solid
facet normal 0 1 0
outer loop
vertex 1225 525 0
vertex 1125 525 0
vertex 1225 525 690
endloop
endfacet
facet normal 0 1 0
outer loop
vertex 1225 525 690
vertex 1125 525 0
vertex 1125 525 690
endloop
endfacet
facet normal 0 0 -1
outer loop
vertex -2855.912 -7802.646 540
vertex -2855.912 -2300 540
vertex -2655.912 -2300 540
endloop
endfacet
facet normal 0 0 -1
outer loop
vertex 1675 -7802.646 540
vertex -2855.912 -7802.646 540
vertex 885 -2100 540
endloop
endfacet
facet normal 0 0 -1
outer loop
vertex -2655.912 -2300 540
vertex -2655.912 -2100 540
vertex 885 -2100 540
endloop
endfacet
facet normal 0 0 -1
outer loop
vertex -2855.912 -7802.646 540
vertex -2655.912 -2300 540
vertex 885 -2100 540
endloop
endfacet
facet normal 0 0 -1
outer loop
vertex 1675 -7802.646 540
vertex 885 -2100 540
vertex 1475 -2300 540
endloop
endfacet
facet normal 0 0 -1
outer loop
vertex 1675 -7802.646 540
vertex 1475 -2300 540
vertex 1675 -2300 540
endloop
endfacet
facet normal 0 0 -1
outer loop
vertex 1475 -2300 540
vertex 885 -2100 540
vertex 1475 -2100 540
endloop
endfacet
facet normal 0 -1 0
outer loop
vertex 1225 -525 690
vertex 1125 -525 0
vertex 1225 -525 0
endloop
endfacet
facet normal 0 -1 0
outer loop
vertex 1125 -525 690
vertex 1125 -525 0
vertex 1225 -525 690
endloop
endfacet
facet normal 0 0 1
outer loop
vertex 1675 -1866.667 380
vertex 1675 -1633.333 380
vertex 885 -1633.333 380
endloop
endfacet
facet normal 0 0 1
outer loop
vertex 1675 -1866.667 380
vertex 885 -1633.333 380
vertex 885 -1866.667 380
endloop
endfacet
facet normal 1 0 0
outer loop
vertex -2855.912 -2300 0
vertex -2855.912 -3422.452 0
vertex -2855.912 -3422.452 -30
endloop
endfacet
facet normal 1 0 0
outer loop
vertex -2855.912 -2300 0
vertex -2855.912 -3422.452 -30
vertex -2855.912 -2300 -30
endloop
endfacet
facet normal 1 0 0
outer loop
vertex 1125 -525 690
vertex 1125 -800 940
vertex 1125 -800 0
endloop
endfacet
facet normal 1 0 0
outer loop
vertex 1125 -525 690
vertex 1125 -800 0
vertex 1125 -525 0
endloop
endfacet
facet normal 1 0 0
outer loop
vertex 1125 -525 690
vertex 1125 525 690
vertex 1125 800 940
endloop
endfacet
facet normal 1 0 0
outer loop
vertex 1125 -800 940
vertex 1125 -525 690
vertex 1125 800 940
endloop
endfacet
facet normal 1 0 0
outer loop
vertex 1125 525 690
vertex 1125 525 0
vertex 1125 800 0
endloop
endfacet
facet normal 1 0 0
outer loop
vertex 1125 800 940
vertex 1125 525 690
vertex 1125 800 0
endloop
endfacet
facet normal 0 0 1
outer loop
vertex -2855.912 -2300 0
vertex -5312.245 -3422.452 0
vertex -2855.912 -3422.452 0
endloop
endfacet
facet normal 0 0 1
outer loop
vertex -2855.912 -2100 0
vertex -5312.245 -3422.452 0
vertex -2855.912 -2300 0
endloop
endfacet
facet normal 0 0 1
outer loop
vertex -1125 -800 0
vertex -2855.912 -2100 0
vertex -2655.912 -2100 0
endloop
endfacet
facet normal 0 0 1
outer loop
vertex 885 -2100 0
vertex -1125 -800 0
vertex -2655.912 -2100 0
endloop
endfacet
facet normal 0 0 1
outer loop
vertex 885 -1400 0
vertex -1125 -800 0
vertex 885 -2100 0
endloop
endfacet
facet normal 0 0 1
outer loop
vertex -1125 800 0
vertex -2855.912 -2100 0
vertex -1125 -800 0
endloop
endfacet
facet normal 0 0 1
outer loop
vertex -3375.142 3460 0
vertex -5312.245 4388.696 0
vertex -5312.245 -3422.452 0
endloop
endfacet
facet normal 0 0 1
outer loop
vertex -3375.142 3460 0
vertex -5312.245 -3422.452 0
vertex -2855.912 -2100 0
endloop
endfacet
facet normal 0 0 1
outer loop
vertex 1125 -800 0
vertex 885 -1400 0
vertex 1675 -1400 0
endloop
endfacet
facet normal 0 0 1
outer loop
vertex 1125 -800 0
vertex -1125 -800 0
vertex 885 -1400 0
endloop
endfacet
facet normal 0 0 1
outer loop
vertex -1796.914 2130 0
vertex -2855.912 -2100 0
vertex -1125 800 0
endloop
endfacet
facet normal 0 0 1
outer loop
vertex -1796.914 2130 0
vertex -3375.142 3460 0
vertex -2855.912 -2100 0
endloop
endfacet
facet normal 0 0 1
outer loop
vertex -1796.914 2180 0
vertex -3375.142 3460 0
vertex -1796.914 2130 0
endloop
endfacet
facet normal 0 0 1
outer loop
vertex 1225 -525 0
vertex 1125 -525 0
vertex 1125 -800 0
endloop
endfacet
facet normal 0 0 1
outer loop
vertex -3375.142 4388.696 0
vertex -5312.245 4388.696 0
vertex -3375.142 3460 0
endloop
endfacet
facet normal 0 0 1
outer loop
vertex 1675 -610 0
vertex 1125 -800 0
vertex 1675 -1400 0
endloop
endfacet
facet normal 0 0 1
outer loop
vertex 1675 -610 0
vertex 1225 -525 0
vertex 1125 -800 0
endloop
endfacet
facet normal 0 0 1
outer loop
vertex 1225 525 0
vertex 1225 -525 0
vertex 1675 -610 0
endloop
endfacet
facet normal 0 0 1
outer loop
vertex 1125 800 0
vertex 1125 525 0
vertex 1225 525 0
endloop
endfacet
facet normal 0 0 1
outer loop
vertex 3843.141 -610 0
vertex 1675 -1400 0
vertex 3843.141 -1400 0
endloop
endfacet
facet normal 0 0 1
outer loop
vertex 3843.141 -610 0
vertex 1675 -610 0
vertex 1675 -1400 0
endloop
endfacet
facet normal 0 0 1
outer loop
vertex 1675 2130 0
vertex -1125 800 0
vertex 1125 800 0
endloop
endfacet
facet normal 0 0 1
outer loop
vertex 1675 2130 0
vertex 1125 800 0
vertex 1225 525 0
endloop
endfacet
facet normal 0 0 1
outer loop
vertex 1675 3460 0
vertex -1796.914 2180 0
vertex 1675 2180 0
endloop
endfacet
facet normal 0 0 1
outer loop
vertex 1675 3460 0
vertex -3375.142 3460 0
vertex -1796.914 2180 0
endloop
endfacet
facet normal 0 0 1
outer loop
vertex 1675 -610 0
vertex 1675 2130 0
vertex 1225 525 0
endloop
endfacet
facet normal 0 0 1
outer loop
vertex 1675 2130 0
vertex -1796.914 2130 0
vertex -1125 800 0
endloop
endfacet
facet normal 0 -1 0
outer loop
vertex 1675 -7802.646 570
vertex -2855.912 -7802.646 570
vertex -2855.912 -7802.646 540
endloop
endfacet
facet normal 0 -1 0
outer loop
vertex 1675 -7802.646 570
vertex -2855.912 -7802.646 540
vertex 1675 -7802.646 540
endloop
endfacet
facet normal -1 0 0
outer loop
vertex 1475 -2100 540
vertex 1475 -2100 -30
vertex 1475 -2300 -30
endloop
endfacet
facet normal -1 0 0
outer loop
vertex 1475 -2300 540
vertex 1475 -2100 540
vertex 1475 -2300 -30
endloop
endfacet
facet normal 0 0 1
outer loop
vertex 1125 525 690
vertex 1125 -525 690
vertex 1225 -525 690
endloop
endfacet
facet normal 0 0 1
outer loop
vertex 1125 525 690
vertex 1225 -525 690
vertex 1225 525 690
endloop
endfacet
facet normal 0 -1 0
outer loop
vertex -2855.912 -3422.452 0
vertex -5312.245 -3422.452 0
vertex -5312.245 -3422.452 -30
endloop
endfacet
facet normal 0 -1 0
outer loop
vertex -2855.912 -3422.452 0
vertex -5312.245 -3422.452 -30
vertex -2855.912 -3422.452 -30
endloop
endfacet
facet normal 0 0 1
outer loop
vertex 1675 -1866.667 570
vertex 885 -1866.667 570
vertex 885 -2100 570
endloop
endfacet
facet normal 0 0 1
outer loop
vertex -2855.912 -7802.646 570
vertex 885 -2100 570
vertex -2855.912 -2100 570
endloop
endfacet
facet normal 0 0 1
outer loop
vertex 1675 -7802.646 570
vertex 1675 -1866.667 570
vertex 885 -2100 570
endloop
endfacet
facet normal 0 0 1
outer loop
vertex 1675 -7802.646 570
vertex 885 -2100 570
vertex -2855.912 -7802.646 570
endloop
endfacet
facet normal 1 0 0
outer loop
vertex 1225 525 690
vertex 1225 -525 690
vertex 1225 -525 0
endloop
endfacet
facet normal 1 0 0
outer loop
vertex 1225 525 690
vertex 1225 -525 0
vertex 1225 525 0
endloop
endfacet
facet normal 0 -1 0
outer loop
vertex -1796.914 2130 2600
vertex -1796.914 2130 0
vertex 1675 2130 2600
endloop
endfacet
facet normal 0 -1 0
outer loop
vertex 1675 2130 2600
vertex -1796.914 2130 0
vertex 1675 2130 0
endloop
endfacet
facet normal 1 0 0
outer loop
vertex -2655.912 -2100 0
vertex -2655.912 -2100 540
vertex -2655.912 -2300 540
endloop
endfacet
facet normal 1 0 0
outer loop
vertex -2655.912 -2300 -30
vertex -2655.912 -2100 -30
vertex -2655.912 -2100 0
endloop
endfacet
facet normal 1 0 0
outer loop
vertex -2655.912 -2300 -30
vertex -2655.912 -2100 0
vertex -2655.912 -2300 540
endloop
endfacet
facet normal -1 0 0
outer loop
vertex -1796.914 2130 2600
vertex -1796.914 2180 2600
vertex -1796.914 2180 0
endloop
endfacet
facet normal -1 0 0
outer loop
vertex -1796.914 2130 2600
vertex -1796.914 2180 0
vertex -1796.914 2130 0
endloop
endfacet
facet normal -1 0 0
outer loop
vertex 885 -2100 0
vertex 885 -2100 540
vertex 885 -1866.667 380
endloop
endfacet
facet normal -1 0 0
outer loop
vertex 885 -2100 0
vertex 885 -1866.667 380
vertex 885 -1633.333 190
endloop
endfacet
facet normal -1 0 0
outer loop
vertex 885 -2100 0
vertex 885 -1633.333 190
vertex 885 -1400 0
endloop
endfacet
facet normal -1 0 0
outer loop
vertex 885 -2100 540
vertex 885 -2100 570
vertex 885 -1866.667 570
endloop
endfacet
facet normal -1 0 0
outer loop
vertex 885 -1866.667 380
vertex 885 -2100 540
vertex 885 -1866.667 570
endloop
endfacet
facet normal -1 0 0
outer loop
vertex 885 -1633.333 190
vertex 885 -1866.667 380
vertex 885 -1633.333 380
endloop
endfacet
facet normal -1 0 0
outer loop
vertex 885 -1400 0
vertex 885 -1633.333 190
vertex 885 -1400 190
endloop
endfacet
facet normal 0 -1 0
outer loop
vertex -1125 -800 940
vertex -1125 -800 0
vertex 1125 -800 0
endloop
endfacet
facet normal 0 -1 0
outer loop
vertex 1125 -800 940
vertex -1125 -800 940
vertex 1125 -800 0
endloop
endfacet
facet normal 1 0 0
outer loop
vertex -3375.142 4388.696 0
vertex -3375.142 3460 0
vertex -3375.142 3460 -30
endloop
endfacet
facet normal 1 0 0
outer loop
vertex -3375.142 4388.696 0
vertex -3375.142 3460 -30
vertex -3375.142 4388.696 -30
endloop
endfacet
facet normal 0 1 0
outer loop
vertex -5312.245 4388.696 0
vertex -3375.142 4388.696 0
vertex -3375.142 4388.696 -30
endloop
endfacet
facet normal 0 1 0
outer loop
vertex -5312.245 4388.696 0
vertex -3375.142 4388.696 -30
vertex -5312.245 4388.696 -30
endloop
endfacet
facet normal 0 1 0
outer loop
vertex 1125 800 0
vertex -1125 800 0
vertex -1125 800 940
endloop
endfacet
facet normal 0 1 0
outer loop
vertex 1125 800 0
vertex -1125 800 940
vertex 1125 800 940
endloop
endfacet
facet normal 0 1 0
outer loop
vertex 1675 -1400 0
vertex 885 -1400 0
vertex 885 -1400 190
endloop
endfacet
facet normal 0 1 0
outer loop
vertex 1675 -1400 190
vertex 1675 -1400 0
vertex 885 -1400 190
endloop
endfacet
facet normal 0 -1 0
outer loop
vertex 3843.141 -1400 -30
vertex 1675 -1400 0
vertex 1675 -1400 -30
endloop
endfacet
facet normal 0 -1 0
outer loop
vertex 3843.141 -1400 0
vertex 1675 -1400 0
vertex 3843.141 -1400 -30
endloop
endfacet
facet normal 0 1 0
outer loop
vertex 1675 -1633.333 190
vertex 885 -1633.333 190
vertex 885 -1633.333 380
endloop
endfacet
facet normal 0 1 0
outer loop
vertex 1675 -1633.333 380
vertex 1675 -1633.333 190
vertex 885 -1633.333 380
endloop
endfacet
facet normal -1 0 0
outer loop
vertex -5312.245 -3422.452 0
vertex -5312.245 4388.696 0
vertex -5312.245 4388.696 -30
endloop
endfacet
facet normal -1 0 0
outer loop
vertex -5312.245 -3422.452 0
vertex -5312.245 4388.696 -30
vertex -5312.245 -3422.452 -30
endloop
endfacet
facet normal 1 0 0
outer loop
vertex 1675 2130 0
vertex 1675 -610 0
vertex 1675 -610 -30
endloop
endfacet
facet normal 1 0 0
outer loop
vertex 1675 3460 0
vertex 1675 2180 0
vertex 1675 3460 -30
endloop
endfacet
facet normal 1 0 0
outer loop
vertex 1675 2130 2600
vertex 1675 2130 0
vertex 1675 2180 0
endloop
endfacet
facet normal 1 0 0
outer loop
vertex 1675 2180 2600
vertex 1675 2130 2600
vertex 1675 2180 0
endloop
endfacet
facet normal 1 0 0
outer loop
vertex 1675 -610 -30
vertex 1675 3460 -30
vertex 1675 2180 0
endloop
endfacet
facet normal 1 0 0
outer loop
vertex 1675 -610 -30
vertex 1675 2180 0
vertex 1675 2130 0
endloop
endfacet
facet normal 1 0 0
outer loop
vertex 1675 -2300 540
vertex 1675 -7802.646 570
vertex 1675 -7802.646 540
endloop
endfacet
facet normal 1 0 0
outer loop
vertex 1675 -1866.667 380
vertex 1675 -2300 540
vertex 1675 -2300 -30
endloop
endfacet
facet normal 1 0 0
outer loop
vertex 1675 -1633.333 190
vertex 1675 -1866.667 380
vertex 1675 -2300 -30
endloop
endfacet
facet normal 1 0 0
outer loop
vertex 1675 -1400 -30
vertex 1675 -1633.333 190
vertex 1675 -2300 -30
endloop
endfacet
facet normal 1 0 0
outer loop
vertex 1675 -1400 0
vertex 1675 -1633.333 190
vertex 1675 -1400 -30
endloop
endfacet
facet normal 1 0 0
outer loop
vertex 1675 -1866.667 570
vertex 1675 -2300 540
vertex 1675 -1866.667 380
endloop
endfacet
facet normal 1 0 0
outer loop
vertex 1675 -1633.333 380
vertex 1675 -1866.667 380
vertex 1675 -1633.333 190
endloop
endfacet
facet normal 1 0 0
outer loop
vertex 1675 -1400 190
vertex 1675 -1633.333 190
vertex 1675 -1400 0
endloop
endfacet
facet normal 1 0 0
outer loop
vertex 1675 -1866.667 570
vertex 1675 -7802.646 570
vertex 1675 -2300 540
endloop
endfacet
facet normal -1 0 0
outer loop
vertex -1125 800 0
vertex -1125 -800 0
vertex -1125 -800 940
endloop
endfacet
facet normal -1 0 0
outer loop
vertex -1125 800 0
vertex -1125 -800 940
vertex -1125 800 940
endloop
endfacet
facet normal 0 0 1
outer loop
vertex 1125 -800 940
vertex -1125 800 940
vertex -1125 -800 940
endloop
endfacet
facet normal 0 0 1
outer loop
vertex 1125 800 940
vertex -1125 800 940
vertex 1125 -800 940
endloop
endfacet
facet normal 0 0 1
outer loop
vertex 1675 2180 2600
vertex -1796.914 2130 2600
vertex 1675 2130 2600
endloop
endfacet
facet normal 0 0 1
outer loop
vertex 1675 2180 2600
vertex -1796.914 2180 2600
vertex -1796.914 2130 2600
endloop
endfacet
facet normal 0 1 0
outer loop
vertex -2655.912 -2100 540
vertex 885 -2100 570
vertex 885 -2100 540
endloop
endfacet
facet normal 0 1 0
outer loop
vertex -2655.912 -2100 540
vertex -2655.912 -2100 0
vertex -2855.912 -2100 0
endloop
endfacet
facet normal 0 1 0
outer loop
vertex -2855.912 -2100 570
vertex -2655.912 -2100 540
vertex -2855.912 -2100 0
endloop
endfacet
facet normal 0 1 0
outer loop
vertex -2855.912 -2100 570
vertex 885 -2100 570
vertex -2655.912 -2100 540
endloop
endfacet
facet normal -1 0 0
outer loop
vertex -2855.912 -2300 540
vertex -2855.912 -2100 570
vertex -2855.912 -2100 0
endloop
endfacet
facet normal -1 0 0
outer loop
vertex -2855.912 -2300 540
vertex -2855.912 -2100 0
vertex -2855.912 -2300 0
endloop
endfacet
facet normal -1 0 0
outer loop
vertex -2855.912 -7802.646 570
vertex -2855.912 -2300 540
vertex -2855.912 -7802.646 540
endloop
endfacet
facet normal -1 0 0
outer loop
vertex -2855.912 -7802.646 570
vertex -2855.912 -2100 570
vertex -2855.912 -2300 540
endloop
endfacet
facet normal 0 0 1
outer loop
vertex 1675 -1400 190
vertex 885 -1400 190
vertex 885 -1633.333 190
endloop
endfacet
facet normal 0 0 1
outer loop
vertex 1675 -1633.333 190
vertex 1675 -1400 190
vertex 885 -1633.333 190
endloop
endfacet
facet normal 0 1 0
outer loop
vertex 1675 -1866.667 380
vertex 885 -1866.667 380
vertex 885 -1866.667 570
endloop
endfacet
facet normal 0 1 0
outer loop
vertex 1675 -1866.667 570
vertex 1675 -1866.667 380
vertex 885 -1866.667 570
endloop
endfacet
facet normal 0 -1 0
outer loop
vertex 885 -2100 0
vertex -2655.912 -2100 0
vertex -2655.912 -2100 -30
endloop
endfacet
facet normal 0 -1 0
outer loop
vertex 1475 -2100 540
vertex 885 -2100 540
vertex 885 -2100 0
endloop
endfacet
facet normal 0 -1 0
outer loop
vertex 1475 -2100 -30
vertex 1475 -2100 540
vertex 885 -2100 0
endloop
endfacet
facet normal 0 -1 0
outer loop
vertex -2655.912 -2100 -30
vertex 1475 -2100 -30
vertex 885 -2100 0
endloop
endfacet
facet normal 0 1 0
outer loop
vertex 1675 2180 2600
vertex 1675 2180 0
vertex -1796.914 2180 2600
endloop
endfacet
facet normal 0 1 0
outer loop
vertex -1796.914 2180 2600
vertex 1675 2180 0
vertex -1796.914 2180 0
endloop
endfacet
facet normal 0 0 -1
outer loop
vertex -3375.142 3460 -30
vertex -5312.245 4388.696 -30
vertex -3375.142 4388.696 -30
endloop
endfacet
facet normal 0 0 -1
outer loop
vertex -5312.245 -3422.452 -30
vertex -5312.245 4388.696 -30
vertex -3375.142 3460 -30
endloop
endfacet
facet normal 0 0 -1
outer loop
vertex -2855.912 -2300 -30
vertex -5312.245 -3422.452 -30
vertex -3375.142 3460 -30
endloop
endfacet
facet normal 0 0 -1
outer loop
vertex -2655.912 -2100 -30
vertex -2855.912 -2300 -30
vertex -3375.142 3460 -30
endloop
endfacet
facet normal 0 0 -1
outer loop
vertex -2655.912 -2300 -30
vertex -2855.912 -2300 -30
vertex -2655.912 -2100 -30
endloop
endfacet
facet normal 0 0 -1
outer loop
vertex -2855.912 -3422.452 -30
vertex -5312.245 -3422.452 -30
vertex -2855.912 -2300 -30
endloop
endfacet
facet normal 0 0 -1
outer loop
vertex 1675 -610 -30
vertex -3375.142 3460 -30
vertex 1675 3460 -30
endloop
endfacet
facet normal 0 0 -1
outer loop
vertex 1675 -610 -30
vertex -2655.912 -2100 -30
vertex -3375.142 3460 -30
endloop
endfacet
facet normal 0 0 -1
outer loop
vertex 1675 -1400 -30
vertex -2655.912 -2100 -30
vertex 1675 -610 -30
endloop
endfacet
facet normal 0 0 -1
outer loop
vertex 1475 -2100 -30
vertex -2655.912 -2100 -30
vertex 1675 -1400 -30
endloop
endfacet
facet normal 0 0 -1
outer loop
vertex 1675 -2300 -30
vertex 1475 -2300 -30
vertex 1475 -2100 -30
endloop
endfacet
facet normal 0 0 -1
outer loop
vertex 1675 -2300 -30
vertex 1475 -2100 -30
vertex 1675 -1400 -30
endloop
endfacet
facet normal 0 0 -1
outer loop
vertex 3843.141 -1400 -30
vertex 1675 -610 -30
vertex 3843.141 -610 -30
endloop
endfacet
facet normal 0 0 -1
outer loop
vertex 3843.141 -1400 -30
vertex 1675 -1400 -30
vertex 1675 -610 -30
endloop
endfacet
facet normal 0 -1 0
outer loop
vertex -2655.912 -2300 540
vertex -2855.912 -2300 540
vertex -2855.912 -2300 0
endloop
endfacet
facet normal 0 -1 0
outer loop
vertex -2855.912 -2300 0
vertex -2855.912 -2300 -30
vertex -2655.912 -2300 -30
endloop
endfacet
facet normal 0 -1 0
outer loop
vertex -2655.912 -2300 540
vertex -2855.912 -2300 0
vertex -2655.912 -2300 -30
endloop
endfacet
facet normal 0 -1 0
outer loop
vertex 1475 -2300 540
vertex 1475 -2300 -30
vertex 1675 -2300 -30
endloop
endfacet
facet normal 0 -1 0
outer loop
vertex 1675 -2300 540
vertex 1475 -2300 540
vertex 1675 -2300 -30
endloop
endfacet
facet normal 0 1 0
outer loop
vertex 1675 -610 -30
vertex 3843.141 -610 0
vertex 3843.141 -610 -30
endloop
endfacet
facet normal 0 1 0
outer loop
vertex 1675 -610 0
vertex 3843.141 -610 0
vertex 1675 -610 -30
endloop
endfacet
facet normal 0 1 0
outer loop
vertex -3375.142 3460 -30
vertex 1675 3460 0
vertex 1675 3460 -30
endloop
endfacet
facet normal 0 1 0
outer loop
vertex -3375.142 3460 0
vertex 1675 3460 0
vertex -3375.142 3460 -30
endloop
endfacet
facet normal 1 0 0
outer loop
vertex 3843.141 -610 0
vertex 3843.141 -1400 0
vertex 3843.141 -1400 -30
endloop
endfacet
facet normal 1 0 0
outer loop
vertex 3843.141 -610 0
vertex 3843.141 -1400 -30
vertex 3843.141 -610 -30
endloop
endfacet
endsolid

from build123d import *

# Parameters (mm, degrees)
F0_W      = 2250
F0_H      = 1600
F1_DEPTH  = 940
F0_W_2    = 500
F0_H_2    = 1800
F0_W_3    = 790
F0_H_3    = 700
F0_W_4    = 1800
F0_H_4    = 500
F2_DEPTH  = 30
F3_W      = 1050
F3_H      = 690
F4_DEPTH  = 100
F5_DEPTH  = 2600
F6_W      = 200
F6_H      = 200
F7_DEPTH  = 600
F9_DEPTH  = 30
F11_DEPTH = 790


# Not quite as in the source:
# - a feature names something its author has since deleted; it is built from what else it names


with BuildPart() as f1:
    # F0 (on Top) → F1 (new body)
    with BuildSketch(Plane.XY):
        Rectangle(F0_W, F0_H)
    extrude(amount=F1_DEPTH)

    # F0 (on Top) → F2 (join)
    with BuildSketch(Plane.XY):
        Polygon((1675, 2130), (3.0863761902, 2130), (-1796.9136238098, 2130), (-1796.9136238098, 2180), (1675, 2180), (1675, 3460), (-3375.1421768536, 3460), (-3375.1421768536, 4388.6961936951), (-5312.2445035196, 4388.6961936951), (-5312.2445035196, -3422.4522947772), (-2855.9122085571, -3422.4522947772), (-2855.9122085571, -2100), (-2855.9122085571, -300), (-2355.9122085571, -300), (-2355.9122085571, -2100), (-1255.9122085571, -2100), (-1255.9122085571, -1600), (544.0877914429, -1600), (544.0877914429, -2100), (885, -2100), (885, -1400), (1675, -1400), (1817.5126314163, -1400), (2516.7963504791, -1400), (3843.1406402588, -1400), (3843.1406402588, -610), (3053.1406402588, -610), (1675, -610), align=None)
        Rectangle(F0_W, F0_H, mode=Mode.SUBTRACT)
        with Locations((-2605.9122085571, -1200)):
            Rectangle(F0_W_2, F0_H_2)
        with Locations((1280, -1750)):
            Rectangle(F0_W_3, F0_H_3)
        Polygon((-1796.9136238098, 2130), (3.0863761902, 2130), (1675, 2130), (1675, 2180), (-1796.9136238098, 2180), align=None)
        Rectangle(F0_W, F0_H)
        with Locations((-355.9122085571, -1850)):
            Rectangle(F0_W_4, F0_H_4)
    extrude(amount=-F2_DEPTH)

    # F3 (on face) → F4 (join)
    with BuildSketch(Plane.YZ.offset(1125)):
        with Locations((0, 345)):
            Rectangle(F3_W, F3_H)
    extrude(amount=F4_DEPTH)

    # F0 (on Top) → F5 (join)
    with BuildSketch(Plane.XY):
        Polygon((-1796.9136238098, 2130), (3.0863761902, 2130), (1675, 2130), (1675, 2180), (-1796.9136238098, 2180), align=None)
    extrude(amount=F5_DEPTH)

    # F6 (on face) → F7 (join)
    with BuildSketch(Plane(origin=(0, 0, -30), x_dir=(1, 0, 0), z_dir=(0, 0, -1))):
        with Locations((-2755.9122085571, 2200)):
            Rectangle(F6_W, F6_H)
        with Locations((1575, 2200)):
            Rectangle(F6_W, F6_H)
    extrude(amount=-F7_DEPTH)

    # F8 (on face) → F9 (join)
    with BuildSketch(Plane.XY.offset(570)):
        Polygon((-2855.9122085571, -7802.6455282672), (1675, -7802.6455282672), (1675, -2100), (885, -2100), (544.0877914429, -2100), (-2855.9122085571, -2100), (-2855.9122085571, -3422.4522947772), align=None)
    extrude(amount=-F9_DEPTH)

    # F10 (on face) → F11 (join, through all)
    with BuildSketch(Plane.YZ.offset(1675)):
        Polygon((-1866.6666666667, 570), (-2100, 570), (-2100, 0), (-1400, 0), (-1400, 190), (-1633.3333333333, 190), (-1633.3333333333, 380), (-1866.6666666667, 380), align=None)
    extrude(amount=-F11_DEPTH)


solid = f1.part
